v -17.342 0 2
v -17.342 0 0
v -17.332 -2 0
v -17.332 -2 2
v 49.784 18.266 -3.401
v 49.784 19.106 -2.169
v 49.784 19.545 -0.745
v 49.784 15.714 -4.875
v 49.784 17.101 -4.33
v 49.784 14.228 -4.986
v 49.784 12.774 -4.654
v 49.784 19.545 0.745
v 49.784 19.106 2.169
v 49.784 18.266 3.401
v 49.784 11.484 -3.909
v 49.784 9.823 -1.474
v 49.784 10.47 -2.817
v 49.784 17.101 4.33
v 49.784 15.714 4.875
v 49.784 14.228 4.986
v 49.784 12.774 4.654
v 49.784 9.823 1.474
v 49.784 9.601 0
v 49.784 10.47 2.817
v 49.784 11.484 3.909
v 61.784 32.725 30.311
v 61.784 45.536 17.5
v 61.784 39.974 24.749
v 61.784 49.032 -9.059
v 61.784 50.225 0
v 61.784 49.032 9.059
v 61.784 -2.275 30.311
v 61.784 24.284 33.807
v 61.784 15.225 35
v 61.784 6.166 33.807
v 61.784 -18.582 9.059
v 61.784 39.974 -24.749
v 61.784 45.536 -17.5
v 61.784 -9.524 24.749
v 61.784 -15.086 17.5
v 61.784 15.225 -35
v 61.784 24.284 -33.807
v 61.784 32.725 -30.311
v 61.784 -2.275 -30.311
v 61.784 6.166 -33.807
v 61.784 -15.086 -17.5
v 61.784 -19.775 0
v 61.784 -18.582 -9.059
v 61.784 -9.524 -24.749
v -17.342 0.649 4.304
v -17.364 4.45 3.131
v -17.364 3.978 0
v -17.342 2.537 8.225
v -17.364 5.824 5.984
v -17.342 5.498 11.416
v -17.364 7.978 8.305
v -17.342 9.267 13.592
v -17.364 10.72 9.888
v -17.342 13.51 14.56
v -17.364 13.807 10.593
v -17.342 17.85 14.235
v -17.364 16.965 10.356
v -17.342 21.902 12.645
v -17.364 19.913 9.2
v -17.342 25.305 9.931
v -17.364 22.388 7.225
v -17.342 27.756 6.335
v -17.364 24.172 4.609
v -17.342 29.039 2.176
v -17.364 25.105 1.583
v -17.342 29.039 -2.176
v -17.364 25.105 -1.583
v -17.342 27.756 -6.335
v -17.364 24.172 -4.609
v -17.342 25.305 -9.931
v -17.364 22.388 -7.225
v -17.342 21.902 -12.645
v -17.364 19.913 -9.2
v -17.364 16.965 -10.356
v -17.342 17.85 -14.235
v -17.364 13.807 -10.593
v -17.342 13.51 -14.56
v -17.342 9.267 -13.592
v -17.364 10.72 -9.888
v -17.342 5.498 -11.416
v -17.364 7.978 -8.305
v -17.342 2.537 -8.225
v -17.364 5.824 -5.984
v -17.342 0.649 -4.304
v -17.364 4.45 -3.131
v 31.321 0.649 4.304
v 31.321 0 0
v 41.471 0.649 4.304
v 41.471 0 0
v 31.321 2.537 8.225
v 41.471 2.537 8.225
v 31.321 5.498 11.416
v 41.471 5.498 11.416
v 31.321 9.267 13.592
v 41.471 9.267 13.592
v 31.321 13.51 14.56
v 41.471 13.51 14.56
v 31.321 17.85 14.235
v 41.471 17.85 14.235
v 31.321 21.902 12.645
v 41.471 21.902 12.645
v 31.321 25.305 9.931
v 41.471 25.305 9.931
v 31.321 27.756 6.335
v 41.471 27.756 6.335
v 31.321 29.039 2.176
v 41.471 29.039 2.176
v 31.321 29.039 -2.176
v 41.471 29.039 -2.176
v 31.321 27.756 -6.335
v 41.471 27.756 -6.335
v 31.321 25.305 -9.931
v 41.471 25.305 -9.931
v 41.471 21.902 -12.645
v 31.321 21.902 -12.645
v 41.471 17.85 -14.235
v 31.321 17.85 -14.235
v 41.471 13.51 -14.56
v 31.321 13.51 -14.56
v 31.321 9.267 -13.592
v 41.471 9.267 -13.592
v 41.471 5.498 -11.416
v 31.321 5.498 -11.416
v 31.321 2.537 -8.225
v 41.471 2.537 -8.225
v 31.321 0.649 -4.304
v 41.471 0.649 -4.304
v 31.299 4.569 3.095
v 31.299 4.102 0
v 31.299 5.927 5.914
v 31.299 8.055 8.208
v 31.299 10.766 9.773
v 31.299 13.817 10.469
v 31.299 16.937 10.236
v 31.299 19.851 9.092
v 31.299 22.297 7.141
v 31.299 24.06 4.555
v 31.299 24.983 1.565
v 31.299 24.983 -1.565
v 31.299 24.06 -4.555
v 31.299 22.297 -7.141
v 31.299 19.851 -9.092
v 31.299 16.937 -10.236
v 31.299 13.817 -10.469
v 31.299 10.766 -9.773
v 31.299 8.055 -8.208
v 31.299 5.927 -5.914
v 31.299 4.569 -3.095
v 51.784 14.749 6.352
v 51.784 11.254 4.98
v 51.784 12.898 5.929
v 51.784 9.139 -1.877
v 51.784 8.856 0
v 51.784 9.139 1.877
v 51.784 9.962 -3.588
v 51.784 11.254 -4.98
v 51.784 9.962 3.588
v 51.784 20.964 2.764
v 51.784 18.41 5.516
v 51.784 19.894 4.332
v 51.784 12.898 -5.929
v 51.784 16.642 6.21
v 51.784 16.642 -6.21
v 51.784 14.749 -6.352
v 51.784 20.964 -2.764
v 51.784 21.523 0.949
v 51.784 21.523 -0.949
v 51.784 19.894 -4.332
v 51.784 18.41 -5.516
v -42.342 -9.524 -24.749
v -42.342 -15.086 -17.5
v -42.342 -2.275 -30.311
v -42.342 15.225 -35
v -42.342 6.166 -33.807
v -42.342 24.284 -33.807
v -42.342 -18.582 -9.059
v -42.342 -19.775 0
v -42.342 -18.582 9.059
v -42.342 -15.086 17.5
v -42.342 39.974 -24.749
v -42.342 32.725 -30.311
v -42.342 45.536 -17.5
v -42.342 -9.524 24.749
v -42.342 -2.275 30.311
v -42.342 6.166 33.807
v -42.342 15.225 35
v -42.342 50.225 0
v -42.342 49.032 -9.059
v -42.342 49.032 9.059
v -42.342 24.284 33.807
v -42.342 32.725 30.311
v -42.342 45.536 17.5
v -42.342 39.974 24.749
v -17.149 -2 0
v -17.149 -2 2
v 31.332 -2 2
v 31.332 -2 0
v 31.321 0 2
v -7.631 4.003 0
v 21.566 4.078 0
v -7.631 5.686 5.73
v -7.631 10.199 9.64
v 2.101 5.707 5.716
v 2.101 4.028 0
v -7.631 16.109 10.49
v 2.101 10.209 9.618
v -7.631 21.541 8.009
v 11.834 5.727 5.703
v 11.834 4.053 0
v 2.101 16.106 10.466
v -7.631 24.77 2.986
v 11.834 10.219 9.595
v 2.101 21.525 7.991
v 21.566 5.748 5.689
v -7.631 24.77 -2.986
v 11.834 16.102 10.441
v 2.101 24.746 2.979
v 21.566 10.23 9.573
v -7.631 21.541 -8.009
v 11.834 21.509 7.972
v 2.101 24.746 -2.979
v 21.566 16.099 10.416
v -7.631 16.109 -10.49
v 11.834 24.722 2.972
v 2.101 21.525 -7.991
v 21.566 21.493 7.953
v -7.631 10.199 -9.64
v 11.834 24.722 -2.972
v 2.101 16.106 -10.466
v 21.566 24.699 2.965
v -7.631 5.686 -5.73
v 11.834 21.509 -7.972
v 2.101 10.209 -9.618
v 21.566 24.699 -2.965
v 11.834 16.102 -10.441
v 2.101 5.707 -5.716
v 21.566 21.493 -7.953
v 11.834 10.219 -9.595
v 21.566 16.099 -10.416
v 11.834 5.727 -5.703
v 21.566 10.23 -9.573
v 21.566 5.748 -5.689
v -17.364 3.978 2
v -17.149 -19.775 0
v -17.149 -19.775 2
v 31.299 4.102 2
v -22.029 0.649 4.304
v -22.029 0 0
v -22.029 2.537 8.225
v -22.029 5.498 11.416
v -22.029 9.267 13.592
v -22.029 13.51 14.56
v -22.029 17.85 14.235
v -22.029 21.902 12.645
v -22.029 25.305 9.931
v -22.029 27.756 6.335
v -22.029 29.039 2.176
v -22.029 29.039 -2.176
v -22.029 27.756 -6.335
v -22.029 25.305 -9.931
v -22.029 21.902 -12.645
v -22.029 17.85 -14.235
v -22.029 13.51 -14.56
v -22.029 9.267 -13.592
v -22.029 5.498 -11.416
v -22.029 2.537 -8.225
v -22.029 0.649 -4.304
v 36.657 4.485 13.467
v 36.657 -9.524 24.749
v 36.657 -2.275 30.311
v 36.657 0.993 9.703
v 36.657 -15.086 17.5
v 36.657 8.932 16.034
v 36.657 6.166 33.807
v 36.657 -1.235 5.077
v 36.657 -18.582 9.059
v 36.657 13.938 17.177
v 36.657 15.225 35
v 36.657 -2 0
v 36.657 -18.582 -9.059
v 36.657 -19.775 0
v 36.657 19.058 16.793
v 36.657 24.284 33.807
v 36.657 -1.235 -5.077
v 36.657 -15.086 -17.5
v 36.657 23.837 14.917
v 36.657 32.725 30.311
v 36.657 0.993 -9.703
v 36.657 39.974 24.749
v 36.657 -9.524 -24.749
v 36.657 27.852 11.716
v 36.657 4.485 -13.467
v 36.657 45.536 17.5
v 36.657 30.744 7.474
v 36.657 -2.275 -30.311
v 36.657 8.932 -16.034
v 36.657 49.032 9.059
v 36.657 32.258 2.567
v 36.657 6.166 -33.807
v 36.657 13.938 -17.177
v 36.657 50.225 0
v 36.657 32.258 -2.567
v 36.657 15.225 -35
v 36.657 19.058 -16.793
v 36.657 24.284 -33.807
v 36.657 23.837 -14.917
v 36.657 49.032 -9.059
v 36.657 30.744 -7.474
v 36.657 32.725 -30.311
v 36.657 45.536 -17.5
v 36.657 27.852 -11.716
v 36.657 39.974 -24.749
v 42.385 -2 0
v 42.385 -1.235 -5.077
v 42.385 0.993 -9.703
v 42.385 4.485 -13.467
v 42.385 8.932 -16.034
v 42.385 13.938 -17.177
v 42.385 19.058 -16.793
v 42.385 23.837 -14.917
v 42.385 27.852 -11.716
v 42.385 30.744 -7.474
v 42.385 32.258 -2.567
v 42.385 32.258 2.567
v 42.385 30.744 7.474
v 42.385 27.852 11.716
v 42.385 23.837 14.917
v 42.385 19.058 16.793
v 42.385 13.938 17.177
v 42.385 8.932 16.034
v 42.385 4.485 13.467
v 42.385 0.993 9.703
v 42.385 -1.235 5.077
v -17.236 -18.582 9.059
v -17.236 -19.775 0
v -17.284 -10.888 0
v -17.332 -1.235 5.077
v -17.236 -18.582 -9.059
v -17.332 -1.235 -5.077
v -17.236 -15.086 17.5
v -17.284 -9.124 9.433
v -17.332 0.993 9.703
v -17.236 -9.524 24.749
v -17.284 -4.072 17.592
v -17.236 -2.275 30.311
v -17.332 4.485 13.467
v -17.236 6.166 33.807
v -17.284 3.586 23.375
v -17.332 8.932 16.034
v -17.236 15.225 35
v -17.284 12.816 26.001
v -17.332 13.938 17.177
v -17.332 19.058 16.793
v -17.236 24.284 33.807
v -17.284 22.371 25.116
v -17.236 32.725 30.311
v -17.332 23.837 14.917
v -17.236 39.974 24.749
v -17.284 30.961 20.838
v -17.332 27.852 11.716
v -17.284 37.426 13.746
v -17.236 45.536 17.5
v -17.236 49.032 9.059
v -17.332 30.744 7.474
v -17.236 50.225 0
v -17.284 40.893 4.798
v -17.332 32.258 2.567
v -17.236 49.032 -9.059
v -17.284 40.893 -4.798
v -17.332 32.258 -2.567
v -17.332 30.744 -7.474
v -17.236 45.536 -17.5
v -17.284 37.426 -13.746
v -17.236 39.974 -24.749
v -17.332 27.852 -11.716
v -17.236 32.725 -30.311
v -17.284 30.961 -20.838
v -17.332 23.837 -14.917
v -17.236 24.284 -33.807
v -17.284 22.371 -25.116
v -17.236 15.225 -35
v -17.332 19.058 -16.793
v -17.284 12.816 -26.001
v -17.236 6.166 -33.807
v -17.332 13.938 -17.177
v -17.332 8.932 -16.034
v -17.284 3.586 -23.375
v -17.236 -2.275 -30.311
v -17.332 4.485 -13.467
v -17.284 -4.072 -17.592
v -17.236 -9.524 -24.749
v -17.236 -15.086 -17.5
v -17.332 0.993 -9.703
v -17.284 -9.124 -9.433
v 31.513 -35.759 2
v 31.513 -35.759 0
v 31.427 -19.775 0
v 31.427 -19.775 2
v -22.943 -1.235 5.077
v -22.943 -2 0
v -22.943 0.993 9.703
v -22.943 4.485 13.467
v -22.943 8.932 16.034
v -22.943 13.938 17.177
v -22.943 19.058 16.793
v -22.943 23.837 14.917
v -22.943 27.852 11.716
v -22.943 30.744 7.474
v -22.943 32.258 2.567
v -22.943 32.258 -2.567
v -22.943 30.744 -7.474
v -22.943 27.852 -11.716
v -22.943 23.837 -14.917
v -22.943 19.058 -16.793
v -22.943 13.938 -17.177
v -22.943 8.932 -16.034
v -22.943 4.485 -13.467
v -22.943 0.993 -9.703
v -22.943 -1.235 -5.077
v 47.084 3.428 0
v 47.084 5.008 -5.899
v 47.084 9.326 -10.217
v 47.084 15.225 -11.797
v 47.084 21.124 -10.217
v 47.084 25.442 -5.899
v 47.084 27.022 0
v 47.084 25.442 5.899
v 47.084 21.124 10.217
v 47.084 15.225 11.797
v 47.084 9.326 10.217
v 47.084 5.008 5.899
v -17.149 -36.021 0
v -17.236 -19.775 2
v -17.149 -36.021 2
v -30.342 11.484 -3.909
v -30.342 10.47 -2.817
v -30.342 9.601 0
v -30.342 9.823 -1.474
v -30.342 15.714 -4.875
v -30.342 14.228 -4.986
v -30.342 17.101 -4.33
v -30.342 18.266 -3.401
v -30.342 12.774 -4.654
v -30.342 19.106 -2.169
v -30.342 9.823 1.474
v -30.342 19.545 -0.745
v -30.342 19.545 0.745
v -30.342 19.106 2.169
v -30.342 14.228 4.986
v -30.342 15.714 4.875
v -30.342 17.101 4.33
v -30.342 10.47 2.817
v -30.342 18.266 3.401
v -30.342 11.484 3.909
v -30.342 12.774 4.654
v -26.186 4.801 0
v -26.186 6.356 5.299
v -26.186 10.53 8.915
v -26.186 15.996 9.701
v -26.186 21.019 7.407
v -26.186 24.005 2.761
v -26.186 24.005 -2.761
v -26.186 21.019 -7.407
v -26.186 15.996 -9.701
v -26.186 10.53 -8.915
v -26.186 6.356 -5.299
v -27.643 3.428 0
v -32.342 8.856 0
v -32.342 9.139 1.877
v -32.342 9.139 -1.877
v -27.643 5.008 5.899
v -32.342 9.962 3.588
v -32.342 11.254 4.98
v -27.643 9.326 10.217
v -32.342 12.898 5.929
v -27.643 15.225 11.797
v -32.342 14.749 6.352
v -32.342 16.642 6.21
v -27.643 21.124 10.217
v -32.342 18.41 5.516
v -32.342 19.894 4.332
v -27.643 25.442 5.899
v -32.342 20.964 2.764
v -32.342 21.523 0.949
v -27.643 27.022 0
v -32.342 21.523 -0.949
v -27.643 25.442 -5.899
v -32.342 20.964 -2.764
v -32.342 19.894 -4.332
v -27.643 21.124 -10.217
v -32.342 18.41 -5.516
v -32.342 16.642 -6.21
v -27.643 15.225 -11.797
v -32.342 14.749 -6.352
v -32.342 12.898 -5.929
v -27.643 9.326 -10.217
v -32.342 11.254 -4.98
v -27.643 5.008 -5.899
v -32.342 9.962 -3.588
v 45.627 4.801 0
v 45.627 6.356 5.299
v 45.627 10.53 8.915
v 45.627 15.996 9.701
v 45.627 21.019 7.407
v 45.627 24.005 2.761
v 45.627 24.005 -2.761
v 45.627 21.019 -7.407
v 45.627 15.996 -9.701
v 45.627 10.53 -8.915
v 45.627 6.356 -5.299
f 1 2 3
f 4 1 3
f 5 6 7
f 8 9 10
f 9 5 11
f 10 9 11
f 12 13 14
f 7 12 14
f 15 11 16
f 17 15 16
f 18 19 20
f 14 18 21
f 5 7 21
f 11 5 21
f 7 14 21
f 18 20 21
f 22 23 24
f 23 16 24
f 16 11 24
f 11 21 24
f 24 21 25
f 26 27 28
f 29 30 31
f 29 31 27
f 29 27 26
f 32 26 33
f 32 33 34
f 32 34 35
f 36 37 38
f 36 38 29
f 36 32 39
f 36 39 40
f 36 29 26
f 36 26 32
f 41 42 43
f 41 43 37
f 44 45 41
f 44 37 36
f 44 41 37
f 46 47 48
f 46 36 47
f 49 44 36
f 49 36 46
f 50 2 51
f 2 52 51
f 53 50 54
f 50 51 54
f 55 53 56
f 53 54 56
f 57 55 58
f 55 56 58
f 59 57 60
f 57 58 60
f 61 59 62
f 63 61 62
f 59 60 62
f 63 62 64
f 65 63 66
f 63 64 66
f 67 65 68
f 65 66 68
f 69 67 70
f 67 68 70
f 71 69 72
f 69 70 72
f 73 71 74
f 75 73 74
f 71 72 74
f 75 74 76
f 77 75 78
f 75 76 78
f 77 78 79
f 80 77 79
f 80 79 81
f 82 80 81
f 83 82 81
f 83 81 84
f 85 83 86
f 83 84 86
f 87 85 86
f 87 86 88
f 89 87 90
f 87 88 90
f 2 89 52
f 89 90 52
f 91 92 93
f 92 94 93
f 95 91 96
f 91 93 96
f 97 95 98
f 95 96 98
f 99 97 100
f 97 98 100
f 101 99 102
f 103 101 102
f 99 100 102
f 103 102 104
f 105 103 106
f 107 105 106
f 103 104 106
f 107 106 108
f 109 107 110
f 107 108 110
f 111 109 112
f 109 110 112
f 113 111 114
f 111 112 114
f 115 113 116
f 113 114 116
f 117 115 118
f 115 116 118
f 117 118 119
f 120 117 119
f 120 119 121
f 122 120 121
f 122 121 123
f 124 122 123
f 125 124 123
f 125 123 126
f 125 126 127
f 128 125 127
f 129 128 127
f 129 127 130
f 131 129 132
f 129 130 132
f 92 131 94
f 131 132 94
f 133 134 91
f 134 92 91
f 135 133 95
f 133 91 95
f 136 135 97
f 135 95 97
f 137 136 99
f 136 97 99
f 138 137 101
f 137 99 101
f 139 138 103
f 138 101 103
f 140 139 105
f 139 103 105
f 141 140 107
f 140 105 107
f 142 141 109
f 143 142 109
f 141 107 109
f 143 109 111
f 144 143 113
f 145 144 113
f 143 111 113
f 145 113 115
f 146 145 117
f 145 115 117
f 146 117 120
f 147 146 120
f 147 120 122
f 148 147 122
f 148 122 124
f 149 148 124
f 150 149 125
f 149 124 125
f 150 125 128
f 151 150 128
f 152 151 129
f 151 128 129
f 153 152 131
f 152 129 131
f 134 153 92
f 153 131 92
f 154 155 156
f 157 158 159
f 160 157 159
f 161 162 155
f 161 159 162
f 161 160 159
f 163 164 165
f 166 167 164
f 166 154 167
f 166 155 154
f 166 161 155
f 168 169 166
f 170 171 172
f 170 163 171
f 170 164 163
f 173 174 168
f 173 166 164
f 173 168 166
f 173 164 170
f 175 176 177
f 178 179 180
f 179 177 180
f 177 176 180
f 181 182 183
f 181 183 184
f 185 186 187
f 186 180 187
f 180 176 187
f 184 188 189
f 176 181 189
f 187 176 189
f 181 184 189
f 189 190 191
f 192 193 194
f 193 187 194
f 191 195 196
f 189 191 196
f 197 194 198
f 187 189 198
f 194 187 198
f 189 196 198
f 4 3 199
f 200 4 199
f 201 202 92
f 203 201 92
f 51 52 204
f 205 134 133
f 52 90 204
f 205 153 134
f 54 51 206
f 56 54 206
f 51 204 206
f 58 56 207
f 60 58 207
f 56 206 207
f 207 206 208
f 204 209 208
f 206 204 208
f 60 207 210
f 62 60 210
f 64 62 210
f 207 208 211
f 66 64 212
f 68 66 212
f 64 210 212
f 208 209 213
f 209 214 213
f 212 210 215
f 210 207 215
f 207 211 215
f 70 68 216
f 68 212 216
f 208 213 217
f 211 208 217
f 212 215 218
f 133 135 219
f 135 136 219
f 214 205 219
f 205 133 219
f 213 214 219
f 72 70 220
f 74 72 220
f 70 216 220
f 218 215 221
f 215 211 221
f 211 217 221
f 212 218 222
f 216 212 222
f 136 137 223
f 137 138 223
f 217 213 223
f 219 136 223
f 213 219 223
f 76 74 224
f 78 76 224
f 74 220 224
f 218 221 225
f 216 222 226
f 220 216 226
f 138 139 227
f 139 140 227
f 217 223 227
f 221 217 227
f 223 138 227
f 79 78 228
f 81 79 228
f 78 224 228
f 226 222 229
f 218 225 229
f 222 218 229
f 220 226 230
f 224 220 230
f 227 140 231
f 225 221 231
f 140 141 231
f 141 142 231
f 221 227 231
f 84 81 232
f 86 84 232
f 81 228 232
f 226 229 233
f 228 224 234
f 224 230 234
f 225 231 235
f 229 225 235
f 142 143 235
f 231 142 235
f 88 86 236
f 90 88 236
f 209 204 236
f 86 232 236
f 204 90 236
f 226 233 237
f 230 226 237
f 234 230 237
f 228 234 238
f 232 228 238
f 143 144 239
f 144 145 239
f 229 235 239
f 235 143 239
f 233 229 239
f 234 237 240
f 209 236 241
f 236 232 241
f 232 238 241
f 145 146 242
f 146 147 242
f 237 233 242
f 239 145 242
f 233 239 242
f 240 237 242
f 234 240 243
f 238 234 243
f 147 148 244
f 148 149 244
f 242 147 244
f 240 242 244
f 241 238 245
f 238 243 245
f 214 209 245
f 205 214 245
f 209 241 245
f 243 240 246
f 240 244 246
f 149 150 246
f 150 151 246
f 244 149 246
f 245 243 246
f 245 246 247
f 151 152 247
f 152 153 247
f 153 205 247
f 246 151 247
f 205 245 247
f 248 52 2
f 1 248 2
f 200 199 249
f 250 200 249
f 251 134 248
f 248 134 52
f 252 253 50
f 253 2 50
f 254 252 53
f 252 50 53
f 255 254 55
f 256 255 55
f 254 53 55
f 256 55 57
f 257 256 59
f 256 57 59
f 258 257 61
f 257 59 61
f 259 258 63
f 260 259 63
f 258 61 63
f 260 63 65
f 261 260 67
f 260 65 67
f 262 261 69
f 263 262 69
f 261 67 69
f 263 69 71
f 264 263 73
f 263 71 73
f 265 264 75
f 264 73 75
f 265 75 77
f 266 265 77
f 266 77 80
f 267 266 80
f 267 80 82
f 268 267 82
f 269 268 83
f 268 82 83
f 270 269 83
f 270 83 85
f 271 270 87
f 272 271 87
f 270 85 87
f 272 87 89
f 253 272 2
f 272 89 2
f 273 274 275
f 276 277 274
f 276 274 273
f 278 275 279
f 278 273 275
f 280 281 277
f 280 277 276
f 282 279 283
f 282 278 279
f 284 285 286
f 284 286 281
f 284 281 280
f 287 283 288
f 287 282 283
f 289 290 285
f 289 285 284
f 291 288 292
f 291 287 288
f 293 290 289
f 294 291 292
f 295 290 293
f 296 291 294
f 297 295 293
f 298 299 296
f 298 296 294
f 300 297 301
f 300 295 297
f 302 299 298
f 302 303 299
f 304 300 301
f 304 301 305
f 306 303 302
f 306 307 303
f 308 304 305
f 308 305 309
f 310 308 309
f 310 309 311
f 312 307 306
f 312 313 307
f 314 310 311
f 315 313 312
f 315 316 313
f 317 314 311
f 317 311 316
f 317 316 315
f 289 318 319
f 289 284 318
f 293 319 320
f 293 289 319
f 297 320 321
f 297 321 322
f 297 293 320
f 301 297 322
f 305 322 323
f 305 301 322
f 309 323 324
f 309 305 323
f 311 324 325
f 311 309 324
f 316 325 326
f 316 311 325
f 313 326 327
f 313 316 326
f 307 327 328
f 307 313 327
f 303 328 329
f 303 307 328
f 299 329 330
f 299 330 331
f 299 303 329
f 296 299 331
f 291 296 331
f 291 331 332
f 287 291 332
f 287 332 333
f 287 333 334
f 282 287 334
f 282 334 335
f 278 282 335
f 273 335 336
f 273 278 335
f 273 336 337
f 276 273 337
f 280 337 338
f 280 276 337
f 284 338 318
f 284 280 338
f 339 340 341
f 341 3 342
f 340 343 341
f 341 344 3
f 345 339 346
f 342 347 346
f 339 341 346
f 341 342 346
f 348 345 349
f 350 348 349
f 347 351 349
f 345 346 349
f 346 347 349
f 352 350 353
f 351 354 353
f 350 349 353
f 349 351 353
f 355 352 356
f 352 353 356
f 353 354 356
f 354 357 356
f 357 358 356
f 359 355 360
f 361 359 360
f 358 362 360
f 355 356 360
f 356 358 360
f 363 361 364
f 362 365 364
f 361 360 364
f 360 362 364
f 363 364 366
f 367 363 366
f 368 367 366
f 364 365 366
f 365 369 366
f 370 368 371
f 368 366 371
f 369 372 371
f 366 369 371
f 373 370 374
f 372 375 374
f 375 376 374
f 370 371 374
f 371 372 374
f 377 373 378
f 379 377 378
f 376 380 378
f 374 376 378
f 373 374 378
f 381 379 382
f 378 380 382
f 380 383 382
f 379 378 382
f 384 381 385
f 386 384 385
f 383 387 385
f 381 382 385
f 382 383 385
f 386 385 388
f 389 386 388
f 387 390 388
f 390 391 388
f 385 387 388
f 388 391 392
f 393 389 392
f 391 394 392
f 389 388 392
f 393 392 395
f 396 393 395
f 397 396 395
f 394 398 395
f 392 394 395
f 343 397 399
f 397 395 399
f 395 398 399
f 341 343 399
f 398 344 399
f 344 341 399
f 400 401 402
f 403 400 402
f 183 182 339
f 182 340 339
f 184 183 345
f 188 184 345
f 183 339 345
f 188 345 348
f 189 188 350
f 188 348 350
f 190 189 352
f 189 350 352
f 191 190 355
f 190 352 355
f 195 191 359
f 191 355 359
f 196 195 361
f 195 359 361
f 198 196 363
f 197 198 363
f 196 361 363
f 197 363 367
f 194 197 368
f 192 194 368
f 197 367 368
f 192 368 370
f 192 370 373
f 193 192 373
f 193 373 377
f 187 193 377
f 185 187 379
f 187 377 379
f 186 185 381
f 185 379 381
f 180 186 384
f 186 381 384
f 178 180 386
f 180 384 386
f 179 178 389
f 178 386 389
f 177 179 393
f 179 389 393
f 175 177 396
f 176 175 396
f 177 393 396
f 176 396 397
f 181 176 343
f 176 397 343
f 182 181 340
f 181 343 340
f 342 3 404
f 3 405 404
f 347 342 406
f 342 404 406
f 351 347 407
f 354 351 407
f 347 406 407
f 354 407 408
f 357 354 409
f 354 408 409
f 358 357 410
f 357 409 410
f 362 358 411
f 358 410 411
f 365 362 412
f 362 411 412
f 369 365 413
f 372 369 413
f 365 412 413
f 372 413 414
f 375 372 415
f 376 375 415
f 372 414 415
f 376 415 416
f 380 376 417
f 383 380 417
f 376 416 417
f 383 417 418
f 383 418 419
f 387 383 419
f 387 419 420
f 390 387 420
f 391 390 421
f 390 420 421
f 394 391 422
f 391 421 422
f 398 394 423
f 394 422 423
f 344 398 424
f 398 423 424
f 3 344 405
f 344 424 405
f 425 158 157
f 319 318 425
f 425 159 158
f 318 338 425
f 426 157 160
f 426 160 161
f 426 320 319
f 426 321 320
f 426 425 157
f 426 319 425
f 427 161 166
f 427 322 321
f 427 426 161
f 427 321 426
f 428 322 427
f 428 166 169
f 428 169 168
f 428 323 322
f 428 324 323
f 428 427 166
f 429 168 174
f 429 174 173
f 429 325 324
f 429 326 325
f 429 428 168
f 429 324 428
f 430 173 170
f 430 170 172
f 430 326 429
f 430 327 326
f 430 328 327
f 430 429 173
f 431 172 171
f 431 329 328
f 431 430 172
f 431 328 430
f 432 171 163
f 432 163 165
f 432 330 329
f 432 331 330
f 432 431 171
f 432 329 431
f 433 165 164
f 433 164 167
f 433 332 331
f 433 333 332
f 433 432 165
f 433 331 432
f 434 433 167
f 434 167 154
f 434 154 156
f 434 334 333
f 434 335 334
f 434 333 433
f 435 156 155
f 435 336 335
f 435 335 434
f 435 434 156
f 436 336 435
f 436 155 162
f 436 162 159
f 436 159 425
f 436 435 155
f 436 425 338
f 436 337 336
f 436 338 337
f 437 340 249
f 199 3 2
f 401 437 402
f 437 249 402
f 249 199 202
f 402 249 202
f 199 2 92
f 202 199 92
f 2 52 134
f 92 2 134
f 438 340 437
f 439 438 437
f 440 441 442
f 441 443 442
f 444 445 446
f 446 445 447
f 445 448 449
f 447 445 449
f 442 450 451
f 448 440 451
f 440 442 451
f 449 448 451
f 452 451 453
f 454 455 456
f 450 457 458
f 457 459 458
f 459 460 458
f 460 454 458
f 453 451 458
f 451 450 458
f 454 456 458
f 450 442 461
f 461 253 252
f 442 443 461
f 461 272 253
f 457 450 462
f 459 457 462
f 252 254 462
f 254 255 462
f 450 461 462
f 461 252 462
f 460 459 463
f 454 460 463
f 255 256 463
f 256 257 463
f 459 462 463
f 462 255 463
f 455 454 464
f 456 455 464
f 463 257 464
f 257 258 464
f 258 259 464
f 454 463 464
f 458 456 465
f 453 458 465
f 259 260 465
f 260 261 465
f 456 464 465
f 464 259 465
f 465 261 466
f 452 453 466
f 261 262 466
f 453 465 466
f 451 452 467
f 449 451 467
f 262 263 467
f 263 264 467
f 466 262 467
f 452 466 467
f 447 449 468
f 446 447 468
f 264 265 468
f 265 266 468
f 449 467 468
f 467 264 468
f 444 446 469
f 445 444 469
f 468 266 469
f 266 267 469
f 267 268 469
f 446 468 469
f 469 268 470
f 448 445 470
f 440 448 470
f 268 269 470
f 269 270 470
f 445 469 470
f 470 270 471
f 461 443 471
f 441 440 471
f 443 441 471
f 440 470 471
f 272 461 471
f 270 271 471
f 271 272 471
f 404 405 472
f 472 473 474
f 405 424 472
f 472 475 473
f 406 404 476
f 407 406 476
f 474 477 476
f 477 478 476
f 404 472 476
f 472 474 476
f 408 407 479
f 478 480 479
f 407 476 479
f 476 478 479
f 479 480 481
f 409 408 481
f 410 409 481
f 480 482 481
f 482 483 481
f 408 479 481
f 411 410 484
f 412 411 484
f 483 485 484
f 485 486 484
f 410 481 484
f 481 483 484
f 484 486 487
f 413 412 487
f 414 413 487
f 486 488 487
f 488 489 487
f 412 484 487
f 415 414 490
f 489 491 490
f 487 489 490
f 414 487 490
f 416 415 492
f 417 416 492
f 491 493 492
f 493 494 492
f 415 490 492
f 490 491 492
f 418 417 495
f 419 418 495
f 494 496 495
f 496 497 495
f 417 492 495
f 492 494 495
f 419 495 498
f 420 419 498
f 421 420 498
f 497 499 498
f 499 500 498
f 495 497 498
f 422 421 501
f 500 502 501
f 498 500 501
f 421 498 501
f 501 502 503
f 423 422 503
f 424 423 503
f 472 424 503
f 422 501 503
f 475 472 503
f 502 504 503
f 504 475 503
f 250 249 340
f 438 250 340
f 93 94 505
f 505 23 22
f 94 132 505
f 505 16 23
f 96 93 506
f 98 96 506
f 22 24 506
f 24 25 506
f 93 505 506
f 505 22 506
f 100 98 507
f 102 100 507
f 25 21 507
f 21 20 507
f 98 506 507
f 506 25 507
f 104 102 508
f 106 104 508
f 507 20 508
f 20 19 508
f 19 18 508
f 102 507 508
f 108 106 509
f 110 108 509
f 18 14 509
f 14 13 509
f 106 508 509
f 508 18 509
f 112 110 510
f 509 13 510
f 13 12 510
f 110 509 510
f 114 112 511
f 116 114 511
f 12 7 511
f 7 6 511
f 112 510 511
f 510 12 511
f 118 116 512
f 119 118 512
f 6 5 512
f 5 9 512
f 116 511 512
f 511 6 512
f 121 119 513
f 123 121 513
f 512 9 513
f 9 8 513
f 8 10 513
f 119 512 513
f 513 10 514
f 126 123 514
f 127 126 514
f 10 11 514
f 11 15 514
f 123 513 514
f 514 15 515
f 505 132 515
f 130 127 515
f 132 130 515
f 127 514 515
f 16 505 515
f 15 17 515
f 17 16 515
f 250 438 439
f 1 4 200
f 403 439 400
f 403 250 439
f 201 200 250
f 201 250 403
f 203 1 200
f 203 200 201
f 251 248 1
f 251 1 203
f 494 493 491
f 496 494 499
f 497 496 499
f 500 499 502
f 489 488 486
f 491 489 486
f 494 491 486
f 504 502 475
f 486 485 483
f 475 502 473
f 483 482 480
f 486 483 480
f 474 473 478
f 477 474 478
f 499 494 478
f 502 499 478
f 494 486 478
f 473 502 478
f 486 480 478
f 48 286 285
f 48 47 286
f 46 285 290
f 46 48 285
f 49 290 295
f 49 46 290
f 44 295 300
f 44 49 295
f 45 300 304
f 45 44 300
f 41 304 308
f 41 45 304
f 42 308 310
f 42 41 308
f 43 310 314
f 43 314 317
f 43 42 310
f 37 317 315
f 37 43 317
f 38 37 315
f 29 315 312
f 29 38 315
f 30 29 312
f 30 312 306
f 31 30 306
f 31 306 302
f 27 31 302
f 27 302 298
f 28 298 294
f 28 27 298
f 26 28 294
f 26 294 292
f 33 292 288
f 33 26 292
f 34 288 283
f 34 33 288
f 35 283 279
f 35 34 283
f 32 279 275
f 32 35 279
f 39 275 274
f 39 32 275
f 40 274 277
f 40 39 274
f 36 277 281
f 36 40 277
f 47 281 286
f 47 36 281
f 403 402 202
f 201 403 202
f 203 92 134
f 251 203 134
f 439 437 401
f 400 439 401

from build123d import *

# Parameters (mm, degrees)
F1_DEPTH = 2


with BuildPart() as f1:
    # F0 (on Top) → F1 (new body)
    with BuildSketch(Plane.XY):
        Polygon((31.5131578421, -35.7591467008), (31.4271690327, -19.7750013322), (-17.1485058373, -19.7750013322), (-17.2359029363, -19.7750013322), (-17.1485058373, -36.0209285118), align=None)
        Polygon((31.4271690327, -19.7750013322), (31.3315460785, -2), (-17.1485058373, -2), (-17.1485058373, -19.7750013322), align=None)
        Polygon((31.3315460785, -2), (31.3207868158, 0), (-17.3422851532, 0), (-17.3315258905, -2), (-17.1485058373, -2), align=None)
        Polygon((-17.3422851532, 0), (31.3207868158, 0), (31.2987173992, 4.1024031496), (-17.3636879772, 3.9784926921), align=None)
    extrude(amount=F1_DEPTH)


with BuildPart() as f2:
    # F0 (on Top) → F2 (revolve)
    with BuildSketch(Plane.XY):
        Polygon((31.3207868158, 0), (41.4709414437, 0), (49.784000963, 9.6011999994), (49.784000963, 14.6011999994), (-30.3421180755, 14.6011999994), (-30.3421180755, 9.6011999994), (-22.0290585563, 0), (-17.3422851532, 0), (-17.3636879772, 3.9784926921), (31.2987173992, 4.1024031496), align=None)
    revolve(axis=Axis((9.7209414437, 14.6011999994, 0), (-1, 0, 0)))


with BuildPart() as f3:
    # F0 (on Top) → F3 (revolve)
    with BuildSketch(Plane.XY):
        Polygon((-17.2359029363, -19.7750013322), (-17.3315258905, -2), (-22.9428902609, -2), (-32.3421180755, 8.8556742412), (-32.3421180755, 15.2249986678), (-42.3421180755, 15.2249986678), (-42.3421180755, -19.7750013322), align=None)
    revolve(axis=Axis((-37.3421180755, 15.2249986678, 0), (-1, 0, 0)))


with BuildPart() as f4:
    # F0 (on Top) → F4 (revolve)
    with BuildSketch(Plane.XY):
        Polygon((42.3847731483, -2), (36.657000963, -2), (36.657000963, -19.7750013322), (40.592000963, -19.7750013322), (61.784000963, -19.7750013322), (61.784000963, 15.2249986678), (51.784000963, 15.2249986678), (51.784000963, 8.8556742412), align=None)
    revolve(axis=Axis((56.784000963, 15.2249986678, 0), (1, 0, 0)))


solid = Compound([f1.part, f2.part, f3.part, f4.part])
